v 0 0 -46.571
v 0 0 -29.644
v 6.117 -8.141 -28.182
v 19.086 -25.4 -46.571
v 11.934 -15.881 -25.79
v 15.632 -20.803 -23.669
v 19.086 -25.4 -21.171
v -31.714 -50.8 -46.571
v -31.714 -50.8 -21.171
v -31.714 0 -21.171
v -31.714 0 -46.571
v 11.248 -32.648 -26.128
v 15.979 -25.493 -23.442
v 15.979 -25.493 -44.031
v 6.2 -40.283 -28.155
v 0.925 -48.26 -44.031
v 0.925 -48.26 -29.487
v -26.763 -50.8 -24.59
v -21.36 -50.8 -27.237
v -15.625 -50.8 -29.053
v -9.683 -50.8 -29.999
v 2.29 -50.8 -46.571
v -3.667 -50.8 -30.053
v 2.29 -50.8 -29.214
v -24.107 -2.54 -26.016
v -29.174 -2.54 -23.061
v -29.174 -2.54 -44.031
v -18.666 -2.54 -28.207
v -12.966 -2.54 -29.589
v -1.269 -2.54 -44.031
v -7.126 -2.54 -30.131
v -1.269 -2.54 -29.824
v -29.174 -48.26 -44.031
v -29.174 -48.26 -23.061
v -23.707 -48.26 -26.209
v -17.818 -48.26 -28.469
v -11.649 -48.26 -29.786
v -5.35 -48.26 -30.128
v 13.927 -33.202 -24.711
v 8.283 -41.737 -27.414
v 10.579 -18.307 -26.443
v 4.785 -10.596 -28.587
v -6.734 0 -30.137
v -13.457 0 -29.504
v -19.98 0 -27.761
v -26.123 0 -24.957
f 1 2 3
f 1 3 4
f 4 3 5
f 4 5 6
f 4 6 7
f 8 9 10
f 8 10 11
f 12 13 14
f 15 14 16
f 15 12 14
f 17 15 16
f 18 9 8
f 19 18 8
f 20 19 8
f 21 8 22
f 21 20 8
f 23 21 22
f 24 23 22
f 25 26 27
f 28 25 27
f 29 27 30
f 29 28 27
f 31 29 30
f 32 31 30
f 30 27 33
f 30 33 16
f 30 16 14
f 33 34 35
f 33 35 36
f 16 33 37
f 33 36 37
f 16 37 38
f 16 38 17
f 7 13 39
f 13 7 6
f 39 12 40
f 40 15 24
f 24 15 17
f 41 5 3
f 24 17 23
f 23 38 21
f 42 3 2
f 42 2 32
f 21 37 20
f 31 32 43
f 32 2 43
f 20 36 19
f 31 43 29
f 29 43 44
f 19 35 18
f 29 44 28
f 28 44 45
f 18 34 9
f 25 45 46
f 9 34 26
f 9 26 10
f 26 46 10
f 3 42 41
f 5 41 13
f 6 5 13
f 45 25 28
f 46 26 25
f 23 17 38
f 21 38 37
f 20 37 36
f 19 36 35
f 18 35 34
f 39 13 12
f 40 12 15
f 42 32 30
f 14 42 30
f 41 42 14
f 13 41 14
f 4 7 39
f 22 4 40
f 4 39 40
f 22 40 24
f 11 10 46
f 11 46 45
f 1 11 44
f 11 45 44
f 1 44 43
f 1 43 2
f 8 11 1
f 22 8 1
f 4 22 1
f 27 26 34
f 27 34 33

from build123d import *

# Parameters (mm, degrees)
F1_DEPTH = 50.8
F3_DEPTH = 46.571707
F4_T     = -2.54


with BuildPart() as f1:
    # F0 (on Front) → F1 (new body)
    with BuildSketch(Plane.XZ):
        with BuildLine():
            Line((-31.713647, -21.170707), (-31.713647, -46.570707))
            Line((-31.713647, -46.570707), (19.086353, -46.570707))
            Line((19.086353, -46.570707), (19.086353, -21.170707))
            ThreePointArc((19.086353, -21.170707), (-6.313647, -30.139476), (-31.713647, -21.170707))
        make_face()
    extrude(amount=F1_DEPTH)

    # F2 (on Top) → F3 (cut, through all)
    with BuildSketch(Plane.XY):
        Polygon((19.086353, -50.8), (19.086353, -25.4), (2.290366, -50.8), align=None)
        Polygon((19.086353, -25.4), (19.086353, 0), (0, 0), align=None)
    extrude(amount=-F3_DEPTH, mode=Mode.SUBTRACT)

    # F4
    f4_openings = [f1.faces().sort_by_distance(p)[0] for p in [
        (-6.313647, -25.4, -30.139476),
    ]]
    offset(amount=F4_T, openings=f4_openings)


solid = f1.part
